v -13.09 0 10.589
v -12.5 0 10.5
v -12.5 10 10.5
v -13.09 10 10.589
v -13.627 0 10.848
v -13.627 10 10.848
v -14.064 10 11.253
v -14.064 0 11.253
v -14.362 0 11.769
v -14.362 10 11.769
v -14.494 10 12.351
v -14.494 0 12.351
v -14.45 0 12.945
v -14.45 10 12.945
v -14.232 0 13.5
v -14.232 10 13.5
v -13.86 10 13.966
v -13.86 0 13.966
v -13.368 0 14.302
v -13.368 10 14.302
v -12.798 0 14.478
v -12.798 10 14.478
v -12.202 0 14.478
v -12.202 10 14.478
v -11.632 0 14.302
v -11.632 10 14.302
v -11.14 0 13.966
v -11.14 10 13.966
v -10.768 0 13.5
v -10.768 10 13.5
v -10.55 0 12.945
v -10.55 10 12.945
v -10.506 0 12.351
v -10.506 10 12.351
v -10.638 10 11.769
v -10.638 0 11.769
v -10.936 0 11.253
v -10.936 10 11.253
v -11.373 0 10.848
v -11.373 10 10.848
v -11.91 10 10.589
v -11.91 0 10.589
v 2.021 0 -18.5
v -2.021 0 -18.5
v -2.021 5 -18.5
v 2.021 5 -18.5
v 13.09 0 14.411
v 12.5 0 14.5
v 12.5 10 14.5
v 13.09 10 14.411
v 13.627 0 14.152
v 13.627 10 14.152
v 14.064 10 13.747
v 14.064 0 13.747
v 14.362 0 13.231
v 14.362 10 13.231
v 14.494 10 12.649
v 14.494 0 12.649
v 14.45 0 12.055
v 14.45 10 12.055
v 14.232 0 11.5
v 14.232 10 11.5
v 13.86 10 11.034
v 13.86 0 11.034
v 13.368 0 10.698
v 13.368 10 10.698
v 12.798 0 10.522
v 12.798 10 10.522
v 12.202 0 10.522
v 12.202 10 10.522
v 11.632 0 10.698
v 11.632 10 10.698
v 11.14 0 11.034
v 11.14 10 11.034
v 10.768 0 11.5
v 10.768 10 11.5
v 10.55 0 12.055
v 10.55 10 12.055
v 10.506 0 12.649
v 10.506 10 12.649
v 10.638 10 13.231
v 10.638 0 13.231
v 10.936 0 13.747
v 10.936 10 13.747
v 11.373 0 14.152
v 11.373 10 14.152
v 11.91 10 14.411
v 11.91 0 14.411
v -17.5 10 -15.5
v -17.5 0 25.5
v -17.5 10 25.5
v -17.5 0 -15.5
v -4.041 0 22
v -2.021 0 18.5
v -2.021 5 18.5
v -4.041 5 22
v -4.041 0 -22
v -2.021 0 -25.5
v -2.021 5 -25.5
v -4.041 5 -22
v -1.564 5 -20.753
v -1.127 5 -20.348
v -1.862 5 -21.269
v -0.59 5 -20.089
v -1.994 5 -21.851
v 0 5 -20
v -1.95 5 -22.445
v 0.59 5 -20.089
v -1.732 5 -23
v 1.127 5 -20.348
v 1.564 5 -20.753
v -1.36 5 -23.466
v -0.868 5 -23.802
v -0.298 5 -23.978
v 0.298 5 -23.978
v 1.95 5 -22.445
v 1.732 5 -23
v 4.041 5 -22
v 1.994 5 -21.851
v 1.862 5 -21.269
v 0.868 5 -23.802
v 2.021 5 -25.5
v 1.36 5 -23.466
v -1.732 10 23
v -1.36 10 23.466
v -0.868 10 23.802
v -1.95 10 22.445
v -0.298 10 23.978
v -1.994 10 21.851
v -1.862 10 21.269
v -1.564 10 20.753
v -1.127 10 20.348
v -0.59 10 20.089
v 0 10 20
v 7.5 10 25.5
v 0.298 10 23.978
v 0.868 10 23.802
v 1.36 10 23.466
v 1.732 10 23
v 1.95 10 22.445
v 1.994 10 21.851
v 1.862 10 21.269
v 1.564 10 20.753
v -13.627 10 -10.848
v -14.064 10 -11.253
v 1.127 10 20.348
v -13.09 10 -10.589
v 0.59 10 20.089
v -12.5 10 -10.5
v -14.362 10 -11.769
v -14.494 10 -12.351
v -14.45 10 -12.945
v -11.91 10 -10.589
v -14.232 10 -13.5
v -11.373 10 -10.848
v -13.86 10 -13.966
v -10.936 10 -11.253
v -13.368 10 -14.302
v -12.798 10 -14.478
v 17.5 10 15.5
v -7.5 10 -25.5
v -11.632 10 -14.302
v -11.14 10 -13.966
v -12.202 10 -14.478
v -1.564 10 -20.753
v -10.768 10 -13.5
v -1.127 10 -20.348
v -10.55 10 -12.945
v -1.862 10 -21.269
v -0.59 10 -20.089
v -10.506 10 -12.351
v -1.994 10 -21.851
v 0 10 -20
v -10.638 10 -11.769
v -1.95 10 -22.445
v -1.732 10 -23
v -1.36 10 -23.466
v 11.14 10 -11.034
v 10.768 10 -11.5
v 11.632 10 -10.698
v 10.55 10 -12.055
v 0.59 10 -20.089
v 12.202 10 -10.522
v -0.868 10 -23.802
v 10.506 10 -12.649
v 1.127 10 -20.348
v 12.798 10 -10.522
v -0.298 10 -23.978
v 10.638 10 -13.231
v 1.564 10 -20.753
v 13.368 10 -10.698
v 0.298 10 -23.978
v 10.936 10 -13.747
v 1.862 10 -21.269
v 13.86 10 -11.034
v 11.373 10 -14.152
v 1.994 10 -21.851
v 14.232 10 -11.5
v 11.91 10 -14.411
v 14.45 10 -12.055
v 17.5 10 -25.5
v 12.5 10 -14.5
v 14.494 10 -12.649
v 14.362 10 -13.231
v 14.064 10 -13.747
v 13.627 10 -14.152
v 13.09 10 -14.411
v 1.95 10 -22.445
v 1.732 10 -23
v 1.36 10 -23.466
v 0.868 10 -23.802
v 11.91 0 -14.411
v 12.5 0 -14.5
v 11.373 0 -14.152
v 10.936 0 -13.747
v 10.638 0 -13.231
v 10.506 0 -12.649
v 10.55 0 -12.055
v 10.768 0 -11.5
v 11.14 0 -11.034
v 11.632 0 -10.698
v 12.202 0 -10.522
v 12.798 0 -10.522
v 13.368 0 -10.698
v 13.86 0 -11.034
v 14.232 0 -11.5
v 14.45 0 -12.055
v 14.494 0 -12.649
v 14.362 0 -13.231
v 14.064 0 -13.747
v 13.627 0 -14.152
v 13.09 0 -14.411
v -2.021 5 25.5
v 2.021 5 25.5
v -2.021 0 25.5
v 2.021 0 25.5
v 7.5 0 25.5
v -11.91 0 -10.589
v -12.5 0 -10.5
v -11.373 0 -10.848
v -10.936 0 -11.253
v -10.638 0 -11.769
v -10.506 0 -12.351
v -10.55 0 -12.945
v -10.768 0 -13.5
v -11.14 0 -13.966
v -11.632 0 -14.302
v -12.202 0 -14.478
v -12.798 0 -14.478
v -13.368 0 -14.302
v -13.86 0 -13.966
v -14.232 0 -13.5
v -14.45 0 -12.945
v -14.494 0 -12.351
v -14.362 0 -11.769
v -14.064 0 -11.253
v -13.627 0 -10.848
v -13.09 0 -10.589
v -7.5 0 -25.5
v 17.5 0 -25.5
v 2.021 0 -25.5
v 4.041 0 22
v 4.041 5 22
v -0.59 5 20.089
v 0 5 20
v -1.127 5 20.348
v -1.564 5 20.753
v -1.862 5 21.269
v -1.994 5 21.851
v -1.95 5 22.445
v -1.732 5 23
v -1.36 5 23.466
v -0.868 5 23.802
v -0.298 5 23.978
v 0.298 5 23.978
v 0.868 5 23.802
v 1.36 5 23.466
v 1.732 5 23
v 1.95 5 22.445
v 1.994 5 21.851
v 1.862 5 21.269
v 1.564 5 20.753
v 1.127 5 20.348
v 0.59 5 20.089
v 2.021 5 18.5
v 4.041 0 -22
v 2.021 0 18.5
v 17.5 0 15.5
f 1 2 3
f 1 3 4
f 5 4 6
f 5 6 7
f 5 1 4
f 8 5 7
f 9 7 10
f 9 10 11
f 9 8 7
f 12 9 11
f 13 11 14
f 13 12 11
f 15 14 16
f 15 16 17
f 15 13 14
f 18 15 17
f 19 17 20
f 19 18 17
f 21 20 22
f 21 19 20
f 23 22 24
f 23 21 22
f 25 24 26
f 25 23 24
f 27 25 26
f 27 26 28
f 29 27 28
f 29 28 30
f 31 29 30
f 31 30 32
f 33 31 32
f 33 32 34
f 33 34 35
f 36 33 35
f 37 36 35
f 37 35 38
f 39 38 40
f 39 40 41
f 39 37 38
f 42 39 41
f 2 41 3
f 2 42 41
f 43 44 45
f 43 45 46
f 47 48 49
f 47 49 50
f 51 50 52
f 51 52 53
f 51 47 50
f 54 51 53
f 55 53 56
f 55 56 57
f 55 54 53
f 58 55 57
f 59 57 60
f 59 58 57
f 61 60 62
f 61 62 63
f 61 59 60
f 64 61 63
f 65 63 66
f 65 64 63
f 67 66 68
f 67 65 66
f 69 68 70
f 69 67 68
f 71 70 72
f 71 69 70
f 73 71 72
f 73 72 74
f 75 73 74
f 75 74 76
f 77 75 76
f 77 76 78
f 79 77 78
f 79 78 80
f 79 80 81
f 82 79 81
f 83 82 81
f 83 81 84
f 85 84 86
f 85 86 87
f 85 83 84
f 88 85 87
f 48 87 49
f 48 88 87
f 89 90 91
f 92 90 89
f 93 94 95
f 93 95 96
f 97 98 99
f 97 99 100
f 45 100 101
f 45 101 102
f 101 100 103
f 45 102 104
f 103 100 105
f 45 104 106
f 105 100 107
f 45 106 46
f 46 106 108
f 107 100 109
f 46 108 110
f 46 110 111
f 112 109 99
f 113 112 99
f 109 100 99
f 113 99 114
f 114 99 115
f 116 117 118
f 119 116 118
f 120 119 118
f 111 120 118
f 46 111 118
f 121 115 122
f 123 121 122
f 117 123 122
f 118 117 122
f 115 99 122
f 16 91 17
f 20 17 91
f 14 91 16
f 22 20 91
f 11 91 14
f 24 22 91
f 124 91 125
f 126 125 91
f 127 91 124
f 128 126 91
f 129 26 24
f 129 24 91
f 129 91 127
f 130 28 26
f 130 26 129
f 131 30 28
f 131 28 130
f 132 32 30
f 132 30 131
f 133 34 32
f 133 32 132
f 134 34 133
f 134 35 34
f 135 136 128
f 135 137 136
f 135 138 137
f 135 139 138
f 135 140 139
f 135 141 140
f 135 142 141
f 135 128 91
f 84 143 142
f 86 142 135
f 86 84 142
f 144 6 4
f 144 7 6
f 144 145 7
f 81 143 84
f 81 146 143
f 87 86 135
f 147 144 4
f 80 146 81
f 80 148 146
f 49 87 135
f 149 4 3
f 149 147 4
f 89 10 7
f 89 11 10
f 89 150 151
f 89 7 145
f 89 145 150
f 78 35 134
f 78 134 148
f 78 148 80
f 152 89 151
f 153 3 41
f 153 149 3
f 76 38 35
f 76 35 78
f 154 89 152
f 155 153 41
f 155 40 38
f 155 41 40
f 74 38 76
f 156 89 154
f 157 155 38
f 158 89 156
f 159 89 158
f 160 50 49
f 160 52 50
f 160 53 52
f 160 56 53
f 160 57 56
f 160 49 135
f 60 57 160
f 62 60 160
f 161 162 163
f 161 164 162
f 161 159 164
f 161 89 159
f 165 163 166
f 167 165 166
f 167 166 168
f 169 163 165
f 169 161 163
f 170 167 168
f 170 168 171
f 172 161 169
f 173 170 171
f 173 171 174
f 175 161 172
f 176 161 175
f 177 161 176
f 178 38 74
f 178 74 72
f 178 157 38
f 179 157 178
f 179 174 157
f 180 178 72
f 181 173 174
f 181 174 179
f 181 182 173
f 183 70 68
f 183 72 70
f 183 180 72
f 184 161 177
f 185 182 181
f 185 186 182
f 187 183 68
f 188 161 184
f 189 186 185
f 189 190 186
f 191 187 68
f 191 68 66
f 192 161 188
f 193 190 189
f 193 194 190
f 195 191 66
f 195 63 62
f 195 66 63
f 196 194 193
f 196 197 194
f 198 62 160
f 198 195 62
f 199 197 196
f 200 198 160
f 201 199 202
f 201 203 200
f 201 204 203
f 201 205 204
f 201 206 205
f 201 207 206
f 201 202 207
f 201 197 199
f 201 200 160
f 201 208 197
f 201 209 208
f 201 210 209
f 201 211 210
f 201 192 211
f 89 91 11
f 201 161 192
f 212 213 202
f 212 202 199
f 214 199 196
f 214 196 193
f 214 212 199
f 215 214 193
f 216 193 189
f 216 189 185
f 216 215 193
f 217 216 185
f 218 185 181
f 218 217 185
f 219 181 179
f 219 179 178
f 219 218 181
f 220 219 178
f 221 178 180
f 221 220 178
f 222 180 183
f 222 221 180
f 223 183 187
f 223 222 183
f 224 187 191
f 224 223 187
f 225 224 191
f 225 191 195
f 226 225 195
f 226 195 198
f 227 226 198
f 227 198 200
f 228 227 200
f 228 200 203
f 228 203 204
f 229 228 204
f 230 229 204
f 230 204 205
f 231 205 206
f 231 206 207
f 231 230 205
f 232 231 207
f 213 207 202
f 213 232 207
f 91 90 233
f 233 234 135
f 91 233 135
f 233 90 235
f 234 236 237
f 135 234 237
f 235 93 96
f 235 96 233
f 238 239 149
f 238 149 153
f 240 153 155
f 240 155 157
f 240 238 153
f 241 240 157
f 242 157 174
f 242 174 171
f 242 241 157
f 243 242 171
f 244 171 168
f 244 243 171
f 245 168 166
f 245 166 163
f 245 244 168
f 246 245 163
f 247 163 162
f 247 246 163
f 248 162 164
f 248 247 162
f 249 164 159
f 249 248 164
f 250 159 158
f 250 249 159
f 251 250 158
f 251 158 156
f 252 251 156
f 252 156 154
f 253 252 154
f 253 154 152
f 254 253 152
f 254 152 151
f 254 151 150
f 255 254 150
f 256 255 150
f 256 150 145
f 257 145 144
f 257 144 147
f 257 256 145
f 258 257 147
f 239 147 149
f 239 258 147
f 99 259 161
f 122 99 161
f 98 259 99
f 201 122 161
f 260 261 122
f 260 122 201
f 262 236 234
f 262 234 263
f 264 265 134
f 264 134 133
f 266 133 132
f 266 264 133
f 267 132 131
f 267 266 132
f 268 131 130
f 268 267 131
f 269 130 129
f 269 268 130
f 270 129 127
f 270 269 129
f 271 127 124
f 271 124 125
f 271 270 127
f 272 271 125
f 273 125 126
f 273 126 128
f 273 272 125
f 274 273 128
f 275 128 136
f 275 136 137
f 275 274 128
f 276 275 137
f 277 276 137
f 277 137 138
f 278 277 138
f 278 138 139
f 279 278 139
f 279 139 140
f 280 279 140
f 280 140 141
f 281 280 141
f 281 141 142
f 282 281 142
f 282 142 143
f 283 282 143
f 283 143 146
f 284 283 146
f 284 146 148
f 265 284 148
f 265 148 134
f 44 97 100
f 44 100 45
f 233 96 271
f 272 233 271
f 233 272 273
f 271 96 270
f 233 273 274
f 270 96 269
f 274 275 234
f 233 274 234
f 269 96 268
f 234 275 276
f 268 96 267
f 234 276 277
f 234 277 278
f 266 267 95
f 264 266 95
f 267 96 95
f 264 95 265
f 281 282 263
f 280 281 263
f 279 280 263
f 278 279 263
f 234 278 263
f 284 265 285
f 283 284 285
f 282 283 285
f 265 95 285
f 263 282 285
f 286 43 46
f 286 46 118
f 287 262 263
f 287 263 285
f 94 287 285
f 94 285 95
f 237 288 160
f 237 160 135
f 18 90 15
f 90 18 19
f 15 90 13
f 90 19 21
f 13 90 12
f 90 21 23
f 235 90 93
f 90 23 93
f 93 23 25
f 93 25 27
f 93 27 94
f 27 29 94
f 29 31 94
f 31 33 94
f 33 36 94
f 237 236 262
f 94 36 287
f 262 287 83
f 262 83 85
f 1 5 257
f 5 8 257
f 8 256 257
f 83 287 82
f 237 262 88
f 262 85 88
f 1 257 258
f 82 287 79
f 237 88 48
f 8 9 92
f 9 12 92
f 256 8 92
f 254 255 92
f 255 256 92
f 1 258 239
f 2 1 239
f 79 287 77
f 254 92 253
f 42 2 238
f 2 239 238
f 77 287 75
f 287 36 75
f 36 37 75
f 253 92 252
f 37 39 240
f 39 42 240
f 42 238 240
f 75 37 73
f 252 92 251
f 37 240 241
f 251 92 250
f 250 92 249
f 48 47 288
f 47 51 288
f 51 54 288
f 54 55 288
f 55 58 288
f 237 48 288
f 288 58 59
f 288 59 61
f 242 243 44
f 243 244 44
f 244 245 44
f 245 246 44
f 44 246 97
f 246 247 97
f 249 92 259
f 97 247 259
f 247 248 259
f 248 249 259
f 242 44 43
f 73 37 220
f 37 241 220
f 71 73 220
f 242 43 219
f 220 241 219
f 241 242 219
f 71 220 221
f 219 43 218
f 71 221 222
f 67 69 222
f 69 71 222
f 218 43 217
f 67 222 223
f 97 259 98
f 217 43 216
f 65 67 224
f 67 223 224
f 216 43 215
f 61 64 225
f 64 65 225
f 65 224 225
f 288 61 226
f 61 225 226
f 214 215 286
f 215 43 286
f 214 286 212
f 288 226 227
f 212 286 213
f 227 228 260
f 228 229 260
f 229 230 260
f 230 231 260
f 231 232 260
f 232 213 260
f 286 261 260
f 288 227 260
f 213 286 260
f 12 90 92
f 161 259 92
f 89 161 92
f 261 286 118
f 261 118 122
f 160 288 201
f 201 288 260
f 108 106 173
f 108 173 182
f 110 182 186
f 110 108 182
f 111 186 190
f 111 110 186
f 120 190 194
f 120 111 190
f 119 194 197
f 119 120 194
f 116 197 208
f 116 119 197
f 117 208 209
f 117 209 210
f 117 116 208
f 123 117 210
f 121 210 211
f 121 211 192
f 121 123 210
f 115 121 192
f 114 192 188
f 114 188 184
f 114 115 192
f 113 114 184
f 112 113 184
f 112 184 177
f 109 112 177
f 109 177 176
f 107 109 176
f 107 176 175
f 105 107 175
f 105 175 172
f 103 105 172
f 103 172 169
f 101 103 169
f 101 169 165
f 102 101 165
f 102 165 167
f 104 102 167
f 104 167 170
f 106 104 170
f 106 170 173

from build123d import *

# Parameters (mm, degrees)
SKETCH1_W           = 35
SKETCH1_H           = 51
SKETCH1_R           = 2
BOSS_EXTRUDE1_DEPTH = 10
CUT_EXTRUDE4_DEPTH  = 5
CUT_EXTRUDE5_DEPTH  = 33.503845926


with BuildPart() as part:
    # Sketch1 → Boss-Extrude1 (new body)
    with BuildSketch(Plane(origin=(0, 0, 0), x_dir=(1, 0, 0), z_dir=(0, 1, 0))):
        Rectangle(SKETCH1_W, SKETCH1_H)
        with Locations(Location((-12.5, 12.5, 0), (0, 0, 270))):
            Circle(SKETCH1_R, mode=Mode.SUBTRACT)
        with Locations(Location((12.5, 12.5, 0), (0, 0, 90))):
            Circle(SKETCH1_R, mode=Mode.SUBTRACT)
        with Locations(Location((12.5, -12.5, 0), (0, 0, 270))):
            Circle(SKETCH1_R, mode=Mode.SUBTRACT)
        with Locations(Location((-12.5, -12.5, 0), (0, 0, 90))):
            Circle(SKETCH1_R, mode=Mode.SUBTRACT)
        with Locations(Location((0, 22, 0), (0, 0, 270))):
            Circle(SKETCH1_R, mode=Mode.SUBTRACT)
        with Locations(Location((0, -22, 0), (0, 0, 90))):
            Circle(SKETCH1_R, mode=Mode.SUBTRACT)
    extrude(amount=BOSS_EXTRUDE1_DEPTH)

    # Sketch2 → Cut-Extrude4 (cut)
    with BuildSketch(Plane(origin=(0, 0, 0), x_dir=(1, 0, 0), z_dir=(0, 1, 0))):
        Polygon((4.041451884, 22), (2.020725942, 25.5), (-2.020725942, 25.5), (-4.041451884, 22), (-2.020725942, 18.5), (2.020725942, 18.5), align=None)
        Polygon((4.041451884, -22), (2.020725942, -18.5), (-2.020725942, -18.5), (-4.041451884, -22), (-2.020725942, -25.5), (2.020725942, -25.5), align=None)
    extrude(amount=CUT_EXTRUDE4_DEPTH, mode=Mode.SUBTRACT)

    # Sketch4 → Cut-Extrude5 (cut, through all)
    with BuildSketch(Plane(origin=(0, 0, 0), x_dir=(1, 0, 0), z_dir=(0, 1, 0))):
        Polygon((-7.5, 25.5), (-17.5, 15.5), (-17.5, 25.5), align=None)
        Polygon((17.5, -15.5), (7.5, -25.5), (17.5, -25.5), align=None)
    extrude(amount=CUT_EXTRUDE5_DEPTH, mode=Mode.SUBTRACT)


solid = part.part
